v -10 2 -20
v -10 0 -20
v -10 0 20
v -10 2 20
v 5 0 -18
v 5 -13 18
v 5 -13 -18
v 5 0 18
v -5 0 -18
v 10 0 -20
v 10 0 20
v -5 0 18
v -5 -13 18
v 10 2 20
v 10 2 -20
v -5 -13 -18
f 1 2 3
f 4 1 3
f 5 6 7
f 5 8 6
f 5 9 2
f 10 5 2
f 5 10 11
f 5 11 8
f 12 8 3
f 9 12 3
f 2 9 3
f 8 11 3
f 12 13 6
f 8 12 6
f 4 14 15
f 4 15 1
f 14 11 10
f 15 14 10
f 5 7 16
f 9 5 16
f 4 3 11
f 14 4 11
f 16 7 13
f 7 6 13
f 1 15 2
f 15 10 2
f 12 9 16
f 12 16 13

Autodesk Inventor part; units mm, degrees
ref_plane "YZ Plane" through (0, 0, 0) normal (1, 0, 0) x (0, 1, 0)
ref_plane "XZ Plane" through (0, 0, 0) normal (0, 1, 0) x (-1, 0, 0)
ref_plane "XY Plane" through (0, 0, 0) normal (0, 0, 1) x (1, 0, 0)
sketch "スケッチ1" plane through (0, 0, 0) normal (0, 1, 0) x (-1, 0, 0)
  line L0 (10, 20) -> (-10, 20)
  line L1 (-10, 20) -> (-10, -20)
  line L2 (-10, -20) -> (10, -20)
  line L3 (10, -20) -> (10, 20)
  line L4 (10, 20) -> (-10, -20) construction
  line L5 (-10, 20) -> (10, -20) construction
  line L6 (5, 18) -> (-5, 18)
  line L7 (-5, 18) -> (-5, -18)
  line L8 (-5, -18) -> (5, -18)
  line L9 (5, -18) -> (5, 18)
  line L10 (5, 18) -> (-5, -18) construction
  line L11 (-5, 18) -> (5, -18) construction
  point P0 (0, 0)
  dimension "d0" = 40
  dimension "d1" = 20
  dimension "d2" = 2
  dimension "d3" = 10
extrude "押し出し1" add sketch "スケッチ1" along normal blind 2 contours L3 L2 L1 L0 | L9 L8 L7 L6
extrude "押し出し2" add sketch "スケッチ1" against normal blind 13 contours L9 L8 L7 L6
properties part number "i2chub"
